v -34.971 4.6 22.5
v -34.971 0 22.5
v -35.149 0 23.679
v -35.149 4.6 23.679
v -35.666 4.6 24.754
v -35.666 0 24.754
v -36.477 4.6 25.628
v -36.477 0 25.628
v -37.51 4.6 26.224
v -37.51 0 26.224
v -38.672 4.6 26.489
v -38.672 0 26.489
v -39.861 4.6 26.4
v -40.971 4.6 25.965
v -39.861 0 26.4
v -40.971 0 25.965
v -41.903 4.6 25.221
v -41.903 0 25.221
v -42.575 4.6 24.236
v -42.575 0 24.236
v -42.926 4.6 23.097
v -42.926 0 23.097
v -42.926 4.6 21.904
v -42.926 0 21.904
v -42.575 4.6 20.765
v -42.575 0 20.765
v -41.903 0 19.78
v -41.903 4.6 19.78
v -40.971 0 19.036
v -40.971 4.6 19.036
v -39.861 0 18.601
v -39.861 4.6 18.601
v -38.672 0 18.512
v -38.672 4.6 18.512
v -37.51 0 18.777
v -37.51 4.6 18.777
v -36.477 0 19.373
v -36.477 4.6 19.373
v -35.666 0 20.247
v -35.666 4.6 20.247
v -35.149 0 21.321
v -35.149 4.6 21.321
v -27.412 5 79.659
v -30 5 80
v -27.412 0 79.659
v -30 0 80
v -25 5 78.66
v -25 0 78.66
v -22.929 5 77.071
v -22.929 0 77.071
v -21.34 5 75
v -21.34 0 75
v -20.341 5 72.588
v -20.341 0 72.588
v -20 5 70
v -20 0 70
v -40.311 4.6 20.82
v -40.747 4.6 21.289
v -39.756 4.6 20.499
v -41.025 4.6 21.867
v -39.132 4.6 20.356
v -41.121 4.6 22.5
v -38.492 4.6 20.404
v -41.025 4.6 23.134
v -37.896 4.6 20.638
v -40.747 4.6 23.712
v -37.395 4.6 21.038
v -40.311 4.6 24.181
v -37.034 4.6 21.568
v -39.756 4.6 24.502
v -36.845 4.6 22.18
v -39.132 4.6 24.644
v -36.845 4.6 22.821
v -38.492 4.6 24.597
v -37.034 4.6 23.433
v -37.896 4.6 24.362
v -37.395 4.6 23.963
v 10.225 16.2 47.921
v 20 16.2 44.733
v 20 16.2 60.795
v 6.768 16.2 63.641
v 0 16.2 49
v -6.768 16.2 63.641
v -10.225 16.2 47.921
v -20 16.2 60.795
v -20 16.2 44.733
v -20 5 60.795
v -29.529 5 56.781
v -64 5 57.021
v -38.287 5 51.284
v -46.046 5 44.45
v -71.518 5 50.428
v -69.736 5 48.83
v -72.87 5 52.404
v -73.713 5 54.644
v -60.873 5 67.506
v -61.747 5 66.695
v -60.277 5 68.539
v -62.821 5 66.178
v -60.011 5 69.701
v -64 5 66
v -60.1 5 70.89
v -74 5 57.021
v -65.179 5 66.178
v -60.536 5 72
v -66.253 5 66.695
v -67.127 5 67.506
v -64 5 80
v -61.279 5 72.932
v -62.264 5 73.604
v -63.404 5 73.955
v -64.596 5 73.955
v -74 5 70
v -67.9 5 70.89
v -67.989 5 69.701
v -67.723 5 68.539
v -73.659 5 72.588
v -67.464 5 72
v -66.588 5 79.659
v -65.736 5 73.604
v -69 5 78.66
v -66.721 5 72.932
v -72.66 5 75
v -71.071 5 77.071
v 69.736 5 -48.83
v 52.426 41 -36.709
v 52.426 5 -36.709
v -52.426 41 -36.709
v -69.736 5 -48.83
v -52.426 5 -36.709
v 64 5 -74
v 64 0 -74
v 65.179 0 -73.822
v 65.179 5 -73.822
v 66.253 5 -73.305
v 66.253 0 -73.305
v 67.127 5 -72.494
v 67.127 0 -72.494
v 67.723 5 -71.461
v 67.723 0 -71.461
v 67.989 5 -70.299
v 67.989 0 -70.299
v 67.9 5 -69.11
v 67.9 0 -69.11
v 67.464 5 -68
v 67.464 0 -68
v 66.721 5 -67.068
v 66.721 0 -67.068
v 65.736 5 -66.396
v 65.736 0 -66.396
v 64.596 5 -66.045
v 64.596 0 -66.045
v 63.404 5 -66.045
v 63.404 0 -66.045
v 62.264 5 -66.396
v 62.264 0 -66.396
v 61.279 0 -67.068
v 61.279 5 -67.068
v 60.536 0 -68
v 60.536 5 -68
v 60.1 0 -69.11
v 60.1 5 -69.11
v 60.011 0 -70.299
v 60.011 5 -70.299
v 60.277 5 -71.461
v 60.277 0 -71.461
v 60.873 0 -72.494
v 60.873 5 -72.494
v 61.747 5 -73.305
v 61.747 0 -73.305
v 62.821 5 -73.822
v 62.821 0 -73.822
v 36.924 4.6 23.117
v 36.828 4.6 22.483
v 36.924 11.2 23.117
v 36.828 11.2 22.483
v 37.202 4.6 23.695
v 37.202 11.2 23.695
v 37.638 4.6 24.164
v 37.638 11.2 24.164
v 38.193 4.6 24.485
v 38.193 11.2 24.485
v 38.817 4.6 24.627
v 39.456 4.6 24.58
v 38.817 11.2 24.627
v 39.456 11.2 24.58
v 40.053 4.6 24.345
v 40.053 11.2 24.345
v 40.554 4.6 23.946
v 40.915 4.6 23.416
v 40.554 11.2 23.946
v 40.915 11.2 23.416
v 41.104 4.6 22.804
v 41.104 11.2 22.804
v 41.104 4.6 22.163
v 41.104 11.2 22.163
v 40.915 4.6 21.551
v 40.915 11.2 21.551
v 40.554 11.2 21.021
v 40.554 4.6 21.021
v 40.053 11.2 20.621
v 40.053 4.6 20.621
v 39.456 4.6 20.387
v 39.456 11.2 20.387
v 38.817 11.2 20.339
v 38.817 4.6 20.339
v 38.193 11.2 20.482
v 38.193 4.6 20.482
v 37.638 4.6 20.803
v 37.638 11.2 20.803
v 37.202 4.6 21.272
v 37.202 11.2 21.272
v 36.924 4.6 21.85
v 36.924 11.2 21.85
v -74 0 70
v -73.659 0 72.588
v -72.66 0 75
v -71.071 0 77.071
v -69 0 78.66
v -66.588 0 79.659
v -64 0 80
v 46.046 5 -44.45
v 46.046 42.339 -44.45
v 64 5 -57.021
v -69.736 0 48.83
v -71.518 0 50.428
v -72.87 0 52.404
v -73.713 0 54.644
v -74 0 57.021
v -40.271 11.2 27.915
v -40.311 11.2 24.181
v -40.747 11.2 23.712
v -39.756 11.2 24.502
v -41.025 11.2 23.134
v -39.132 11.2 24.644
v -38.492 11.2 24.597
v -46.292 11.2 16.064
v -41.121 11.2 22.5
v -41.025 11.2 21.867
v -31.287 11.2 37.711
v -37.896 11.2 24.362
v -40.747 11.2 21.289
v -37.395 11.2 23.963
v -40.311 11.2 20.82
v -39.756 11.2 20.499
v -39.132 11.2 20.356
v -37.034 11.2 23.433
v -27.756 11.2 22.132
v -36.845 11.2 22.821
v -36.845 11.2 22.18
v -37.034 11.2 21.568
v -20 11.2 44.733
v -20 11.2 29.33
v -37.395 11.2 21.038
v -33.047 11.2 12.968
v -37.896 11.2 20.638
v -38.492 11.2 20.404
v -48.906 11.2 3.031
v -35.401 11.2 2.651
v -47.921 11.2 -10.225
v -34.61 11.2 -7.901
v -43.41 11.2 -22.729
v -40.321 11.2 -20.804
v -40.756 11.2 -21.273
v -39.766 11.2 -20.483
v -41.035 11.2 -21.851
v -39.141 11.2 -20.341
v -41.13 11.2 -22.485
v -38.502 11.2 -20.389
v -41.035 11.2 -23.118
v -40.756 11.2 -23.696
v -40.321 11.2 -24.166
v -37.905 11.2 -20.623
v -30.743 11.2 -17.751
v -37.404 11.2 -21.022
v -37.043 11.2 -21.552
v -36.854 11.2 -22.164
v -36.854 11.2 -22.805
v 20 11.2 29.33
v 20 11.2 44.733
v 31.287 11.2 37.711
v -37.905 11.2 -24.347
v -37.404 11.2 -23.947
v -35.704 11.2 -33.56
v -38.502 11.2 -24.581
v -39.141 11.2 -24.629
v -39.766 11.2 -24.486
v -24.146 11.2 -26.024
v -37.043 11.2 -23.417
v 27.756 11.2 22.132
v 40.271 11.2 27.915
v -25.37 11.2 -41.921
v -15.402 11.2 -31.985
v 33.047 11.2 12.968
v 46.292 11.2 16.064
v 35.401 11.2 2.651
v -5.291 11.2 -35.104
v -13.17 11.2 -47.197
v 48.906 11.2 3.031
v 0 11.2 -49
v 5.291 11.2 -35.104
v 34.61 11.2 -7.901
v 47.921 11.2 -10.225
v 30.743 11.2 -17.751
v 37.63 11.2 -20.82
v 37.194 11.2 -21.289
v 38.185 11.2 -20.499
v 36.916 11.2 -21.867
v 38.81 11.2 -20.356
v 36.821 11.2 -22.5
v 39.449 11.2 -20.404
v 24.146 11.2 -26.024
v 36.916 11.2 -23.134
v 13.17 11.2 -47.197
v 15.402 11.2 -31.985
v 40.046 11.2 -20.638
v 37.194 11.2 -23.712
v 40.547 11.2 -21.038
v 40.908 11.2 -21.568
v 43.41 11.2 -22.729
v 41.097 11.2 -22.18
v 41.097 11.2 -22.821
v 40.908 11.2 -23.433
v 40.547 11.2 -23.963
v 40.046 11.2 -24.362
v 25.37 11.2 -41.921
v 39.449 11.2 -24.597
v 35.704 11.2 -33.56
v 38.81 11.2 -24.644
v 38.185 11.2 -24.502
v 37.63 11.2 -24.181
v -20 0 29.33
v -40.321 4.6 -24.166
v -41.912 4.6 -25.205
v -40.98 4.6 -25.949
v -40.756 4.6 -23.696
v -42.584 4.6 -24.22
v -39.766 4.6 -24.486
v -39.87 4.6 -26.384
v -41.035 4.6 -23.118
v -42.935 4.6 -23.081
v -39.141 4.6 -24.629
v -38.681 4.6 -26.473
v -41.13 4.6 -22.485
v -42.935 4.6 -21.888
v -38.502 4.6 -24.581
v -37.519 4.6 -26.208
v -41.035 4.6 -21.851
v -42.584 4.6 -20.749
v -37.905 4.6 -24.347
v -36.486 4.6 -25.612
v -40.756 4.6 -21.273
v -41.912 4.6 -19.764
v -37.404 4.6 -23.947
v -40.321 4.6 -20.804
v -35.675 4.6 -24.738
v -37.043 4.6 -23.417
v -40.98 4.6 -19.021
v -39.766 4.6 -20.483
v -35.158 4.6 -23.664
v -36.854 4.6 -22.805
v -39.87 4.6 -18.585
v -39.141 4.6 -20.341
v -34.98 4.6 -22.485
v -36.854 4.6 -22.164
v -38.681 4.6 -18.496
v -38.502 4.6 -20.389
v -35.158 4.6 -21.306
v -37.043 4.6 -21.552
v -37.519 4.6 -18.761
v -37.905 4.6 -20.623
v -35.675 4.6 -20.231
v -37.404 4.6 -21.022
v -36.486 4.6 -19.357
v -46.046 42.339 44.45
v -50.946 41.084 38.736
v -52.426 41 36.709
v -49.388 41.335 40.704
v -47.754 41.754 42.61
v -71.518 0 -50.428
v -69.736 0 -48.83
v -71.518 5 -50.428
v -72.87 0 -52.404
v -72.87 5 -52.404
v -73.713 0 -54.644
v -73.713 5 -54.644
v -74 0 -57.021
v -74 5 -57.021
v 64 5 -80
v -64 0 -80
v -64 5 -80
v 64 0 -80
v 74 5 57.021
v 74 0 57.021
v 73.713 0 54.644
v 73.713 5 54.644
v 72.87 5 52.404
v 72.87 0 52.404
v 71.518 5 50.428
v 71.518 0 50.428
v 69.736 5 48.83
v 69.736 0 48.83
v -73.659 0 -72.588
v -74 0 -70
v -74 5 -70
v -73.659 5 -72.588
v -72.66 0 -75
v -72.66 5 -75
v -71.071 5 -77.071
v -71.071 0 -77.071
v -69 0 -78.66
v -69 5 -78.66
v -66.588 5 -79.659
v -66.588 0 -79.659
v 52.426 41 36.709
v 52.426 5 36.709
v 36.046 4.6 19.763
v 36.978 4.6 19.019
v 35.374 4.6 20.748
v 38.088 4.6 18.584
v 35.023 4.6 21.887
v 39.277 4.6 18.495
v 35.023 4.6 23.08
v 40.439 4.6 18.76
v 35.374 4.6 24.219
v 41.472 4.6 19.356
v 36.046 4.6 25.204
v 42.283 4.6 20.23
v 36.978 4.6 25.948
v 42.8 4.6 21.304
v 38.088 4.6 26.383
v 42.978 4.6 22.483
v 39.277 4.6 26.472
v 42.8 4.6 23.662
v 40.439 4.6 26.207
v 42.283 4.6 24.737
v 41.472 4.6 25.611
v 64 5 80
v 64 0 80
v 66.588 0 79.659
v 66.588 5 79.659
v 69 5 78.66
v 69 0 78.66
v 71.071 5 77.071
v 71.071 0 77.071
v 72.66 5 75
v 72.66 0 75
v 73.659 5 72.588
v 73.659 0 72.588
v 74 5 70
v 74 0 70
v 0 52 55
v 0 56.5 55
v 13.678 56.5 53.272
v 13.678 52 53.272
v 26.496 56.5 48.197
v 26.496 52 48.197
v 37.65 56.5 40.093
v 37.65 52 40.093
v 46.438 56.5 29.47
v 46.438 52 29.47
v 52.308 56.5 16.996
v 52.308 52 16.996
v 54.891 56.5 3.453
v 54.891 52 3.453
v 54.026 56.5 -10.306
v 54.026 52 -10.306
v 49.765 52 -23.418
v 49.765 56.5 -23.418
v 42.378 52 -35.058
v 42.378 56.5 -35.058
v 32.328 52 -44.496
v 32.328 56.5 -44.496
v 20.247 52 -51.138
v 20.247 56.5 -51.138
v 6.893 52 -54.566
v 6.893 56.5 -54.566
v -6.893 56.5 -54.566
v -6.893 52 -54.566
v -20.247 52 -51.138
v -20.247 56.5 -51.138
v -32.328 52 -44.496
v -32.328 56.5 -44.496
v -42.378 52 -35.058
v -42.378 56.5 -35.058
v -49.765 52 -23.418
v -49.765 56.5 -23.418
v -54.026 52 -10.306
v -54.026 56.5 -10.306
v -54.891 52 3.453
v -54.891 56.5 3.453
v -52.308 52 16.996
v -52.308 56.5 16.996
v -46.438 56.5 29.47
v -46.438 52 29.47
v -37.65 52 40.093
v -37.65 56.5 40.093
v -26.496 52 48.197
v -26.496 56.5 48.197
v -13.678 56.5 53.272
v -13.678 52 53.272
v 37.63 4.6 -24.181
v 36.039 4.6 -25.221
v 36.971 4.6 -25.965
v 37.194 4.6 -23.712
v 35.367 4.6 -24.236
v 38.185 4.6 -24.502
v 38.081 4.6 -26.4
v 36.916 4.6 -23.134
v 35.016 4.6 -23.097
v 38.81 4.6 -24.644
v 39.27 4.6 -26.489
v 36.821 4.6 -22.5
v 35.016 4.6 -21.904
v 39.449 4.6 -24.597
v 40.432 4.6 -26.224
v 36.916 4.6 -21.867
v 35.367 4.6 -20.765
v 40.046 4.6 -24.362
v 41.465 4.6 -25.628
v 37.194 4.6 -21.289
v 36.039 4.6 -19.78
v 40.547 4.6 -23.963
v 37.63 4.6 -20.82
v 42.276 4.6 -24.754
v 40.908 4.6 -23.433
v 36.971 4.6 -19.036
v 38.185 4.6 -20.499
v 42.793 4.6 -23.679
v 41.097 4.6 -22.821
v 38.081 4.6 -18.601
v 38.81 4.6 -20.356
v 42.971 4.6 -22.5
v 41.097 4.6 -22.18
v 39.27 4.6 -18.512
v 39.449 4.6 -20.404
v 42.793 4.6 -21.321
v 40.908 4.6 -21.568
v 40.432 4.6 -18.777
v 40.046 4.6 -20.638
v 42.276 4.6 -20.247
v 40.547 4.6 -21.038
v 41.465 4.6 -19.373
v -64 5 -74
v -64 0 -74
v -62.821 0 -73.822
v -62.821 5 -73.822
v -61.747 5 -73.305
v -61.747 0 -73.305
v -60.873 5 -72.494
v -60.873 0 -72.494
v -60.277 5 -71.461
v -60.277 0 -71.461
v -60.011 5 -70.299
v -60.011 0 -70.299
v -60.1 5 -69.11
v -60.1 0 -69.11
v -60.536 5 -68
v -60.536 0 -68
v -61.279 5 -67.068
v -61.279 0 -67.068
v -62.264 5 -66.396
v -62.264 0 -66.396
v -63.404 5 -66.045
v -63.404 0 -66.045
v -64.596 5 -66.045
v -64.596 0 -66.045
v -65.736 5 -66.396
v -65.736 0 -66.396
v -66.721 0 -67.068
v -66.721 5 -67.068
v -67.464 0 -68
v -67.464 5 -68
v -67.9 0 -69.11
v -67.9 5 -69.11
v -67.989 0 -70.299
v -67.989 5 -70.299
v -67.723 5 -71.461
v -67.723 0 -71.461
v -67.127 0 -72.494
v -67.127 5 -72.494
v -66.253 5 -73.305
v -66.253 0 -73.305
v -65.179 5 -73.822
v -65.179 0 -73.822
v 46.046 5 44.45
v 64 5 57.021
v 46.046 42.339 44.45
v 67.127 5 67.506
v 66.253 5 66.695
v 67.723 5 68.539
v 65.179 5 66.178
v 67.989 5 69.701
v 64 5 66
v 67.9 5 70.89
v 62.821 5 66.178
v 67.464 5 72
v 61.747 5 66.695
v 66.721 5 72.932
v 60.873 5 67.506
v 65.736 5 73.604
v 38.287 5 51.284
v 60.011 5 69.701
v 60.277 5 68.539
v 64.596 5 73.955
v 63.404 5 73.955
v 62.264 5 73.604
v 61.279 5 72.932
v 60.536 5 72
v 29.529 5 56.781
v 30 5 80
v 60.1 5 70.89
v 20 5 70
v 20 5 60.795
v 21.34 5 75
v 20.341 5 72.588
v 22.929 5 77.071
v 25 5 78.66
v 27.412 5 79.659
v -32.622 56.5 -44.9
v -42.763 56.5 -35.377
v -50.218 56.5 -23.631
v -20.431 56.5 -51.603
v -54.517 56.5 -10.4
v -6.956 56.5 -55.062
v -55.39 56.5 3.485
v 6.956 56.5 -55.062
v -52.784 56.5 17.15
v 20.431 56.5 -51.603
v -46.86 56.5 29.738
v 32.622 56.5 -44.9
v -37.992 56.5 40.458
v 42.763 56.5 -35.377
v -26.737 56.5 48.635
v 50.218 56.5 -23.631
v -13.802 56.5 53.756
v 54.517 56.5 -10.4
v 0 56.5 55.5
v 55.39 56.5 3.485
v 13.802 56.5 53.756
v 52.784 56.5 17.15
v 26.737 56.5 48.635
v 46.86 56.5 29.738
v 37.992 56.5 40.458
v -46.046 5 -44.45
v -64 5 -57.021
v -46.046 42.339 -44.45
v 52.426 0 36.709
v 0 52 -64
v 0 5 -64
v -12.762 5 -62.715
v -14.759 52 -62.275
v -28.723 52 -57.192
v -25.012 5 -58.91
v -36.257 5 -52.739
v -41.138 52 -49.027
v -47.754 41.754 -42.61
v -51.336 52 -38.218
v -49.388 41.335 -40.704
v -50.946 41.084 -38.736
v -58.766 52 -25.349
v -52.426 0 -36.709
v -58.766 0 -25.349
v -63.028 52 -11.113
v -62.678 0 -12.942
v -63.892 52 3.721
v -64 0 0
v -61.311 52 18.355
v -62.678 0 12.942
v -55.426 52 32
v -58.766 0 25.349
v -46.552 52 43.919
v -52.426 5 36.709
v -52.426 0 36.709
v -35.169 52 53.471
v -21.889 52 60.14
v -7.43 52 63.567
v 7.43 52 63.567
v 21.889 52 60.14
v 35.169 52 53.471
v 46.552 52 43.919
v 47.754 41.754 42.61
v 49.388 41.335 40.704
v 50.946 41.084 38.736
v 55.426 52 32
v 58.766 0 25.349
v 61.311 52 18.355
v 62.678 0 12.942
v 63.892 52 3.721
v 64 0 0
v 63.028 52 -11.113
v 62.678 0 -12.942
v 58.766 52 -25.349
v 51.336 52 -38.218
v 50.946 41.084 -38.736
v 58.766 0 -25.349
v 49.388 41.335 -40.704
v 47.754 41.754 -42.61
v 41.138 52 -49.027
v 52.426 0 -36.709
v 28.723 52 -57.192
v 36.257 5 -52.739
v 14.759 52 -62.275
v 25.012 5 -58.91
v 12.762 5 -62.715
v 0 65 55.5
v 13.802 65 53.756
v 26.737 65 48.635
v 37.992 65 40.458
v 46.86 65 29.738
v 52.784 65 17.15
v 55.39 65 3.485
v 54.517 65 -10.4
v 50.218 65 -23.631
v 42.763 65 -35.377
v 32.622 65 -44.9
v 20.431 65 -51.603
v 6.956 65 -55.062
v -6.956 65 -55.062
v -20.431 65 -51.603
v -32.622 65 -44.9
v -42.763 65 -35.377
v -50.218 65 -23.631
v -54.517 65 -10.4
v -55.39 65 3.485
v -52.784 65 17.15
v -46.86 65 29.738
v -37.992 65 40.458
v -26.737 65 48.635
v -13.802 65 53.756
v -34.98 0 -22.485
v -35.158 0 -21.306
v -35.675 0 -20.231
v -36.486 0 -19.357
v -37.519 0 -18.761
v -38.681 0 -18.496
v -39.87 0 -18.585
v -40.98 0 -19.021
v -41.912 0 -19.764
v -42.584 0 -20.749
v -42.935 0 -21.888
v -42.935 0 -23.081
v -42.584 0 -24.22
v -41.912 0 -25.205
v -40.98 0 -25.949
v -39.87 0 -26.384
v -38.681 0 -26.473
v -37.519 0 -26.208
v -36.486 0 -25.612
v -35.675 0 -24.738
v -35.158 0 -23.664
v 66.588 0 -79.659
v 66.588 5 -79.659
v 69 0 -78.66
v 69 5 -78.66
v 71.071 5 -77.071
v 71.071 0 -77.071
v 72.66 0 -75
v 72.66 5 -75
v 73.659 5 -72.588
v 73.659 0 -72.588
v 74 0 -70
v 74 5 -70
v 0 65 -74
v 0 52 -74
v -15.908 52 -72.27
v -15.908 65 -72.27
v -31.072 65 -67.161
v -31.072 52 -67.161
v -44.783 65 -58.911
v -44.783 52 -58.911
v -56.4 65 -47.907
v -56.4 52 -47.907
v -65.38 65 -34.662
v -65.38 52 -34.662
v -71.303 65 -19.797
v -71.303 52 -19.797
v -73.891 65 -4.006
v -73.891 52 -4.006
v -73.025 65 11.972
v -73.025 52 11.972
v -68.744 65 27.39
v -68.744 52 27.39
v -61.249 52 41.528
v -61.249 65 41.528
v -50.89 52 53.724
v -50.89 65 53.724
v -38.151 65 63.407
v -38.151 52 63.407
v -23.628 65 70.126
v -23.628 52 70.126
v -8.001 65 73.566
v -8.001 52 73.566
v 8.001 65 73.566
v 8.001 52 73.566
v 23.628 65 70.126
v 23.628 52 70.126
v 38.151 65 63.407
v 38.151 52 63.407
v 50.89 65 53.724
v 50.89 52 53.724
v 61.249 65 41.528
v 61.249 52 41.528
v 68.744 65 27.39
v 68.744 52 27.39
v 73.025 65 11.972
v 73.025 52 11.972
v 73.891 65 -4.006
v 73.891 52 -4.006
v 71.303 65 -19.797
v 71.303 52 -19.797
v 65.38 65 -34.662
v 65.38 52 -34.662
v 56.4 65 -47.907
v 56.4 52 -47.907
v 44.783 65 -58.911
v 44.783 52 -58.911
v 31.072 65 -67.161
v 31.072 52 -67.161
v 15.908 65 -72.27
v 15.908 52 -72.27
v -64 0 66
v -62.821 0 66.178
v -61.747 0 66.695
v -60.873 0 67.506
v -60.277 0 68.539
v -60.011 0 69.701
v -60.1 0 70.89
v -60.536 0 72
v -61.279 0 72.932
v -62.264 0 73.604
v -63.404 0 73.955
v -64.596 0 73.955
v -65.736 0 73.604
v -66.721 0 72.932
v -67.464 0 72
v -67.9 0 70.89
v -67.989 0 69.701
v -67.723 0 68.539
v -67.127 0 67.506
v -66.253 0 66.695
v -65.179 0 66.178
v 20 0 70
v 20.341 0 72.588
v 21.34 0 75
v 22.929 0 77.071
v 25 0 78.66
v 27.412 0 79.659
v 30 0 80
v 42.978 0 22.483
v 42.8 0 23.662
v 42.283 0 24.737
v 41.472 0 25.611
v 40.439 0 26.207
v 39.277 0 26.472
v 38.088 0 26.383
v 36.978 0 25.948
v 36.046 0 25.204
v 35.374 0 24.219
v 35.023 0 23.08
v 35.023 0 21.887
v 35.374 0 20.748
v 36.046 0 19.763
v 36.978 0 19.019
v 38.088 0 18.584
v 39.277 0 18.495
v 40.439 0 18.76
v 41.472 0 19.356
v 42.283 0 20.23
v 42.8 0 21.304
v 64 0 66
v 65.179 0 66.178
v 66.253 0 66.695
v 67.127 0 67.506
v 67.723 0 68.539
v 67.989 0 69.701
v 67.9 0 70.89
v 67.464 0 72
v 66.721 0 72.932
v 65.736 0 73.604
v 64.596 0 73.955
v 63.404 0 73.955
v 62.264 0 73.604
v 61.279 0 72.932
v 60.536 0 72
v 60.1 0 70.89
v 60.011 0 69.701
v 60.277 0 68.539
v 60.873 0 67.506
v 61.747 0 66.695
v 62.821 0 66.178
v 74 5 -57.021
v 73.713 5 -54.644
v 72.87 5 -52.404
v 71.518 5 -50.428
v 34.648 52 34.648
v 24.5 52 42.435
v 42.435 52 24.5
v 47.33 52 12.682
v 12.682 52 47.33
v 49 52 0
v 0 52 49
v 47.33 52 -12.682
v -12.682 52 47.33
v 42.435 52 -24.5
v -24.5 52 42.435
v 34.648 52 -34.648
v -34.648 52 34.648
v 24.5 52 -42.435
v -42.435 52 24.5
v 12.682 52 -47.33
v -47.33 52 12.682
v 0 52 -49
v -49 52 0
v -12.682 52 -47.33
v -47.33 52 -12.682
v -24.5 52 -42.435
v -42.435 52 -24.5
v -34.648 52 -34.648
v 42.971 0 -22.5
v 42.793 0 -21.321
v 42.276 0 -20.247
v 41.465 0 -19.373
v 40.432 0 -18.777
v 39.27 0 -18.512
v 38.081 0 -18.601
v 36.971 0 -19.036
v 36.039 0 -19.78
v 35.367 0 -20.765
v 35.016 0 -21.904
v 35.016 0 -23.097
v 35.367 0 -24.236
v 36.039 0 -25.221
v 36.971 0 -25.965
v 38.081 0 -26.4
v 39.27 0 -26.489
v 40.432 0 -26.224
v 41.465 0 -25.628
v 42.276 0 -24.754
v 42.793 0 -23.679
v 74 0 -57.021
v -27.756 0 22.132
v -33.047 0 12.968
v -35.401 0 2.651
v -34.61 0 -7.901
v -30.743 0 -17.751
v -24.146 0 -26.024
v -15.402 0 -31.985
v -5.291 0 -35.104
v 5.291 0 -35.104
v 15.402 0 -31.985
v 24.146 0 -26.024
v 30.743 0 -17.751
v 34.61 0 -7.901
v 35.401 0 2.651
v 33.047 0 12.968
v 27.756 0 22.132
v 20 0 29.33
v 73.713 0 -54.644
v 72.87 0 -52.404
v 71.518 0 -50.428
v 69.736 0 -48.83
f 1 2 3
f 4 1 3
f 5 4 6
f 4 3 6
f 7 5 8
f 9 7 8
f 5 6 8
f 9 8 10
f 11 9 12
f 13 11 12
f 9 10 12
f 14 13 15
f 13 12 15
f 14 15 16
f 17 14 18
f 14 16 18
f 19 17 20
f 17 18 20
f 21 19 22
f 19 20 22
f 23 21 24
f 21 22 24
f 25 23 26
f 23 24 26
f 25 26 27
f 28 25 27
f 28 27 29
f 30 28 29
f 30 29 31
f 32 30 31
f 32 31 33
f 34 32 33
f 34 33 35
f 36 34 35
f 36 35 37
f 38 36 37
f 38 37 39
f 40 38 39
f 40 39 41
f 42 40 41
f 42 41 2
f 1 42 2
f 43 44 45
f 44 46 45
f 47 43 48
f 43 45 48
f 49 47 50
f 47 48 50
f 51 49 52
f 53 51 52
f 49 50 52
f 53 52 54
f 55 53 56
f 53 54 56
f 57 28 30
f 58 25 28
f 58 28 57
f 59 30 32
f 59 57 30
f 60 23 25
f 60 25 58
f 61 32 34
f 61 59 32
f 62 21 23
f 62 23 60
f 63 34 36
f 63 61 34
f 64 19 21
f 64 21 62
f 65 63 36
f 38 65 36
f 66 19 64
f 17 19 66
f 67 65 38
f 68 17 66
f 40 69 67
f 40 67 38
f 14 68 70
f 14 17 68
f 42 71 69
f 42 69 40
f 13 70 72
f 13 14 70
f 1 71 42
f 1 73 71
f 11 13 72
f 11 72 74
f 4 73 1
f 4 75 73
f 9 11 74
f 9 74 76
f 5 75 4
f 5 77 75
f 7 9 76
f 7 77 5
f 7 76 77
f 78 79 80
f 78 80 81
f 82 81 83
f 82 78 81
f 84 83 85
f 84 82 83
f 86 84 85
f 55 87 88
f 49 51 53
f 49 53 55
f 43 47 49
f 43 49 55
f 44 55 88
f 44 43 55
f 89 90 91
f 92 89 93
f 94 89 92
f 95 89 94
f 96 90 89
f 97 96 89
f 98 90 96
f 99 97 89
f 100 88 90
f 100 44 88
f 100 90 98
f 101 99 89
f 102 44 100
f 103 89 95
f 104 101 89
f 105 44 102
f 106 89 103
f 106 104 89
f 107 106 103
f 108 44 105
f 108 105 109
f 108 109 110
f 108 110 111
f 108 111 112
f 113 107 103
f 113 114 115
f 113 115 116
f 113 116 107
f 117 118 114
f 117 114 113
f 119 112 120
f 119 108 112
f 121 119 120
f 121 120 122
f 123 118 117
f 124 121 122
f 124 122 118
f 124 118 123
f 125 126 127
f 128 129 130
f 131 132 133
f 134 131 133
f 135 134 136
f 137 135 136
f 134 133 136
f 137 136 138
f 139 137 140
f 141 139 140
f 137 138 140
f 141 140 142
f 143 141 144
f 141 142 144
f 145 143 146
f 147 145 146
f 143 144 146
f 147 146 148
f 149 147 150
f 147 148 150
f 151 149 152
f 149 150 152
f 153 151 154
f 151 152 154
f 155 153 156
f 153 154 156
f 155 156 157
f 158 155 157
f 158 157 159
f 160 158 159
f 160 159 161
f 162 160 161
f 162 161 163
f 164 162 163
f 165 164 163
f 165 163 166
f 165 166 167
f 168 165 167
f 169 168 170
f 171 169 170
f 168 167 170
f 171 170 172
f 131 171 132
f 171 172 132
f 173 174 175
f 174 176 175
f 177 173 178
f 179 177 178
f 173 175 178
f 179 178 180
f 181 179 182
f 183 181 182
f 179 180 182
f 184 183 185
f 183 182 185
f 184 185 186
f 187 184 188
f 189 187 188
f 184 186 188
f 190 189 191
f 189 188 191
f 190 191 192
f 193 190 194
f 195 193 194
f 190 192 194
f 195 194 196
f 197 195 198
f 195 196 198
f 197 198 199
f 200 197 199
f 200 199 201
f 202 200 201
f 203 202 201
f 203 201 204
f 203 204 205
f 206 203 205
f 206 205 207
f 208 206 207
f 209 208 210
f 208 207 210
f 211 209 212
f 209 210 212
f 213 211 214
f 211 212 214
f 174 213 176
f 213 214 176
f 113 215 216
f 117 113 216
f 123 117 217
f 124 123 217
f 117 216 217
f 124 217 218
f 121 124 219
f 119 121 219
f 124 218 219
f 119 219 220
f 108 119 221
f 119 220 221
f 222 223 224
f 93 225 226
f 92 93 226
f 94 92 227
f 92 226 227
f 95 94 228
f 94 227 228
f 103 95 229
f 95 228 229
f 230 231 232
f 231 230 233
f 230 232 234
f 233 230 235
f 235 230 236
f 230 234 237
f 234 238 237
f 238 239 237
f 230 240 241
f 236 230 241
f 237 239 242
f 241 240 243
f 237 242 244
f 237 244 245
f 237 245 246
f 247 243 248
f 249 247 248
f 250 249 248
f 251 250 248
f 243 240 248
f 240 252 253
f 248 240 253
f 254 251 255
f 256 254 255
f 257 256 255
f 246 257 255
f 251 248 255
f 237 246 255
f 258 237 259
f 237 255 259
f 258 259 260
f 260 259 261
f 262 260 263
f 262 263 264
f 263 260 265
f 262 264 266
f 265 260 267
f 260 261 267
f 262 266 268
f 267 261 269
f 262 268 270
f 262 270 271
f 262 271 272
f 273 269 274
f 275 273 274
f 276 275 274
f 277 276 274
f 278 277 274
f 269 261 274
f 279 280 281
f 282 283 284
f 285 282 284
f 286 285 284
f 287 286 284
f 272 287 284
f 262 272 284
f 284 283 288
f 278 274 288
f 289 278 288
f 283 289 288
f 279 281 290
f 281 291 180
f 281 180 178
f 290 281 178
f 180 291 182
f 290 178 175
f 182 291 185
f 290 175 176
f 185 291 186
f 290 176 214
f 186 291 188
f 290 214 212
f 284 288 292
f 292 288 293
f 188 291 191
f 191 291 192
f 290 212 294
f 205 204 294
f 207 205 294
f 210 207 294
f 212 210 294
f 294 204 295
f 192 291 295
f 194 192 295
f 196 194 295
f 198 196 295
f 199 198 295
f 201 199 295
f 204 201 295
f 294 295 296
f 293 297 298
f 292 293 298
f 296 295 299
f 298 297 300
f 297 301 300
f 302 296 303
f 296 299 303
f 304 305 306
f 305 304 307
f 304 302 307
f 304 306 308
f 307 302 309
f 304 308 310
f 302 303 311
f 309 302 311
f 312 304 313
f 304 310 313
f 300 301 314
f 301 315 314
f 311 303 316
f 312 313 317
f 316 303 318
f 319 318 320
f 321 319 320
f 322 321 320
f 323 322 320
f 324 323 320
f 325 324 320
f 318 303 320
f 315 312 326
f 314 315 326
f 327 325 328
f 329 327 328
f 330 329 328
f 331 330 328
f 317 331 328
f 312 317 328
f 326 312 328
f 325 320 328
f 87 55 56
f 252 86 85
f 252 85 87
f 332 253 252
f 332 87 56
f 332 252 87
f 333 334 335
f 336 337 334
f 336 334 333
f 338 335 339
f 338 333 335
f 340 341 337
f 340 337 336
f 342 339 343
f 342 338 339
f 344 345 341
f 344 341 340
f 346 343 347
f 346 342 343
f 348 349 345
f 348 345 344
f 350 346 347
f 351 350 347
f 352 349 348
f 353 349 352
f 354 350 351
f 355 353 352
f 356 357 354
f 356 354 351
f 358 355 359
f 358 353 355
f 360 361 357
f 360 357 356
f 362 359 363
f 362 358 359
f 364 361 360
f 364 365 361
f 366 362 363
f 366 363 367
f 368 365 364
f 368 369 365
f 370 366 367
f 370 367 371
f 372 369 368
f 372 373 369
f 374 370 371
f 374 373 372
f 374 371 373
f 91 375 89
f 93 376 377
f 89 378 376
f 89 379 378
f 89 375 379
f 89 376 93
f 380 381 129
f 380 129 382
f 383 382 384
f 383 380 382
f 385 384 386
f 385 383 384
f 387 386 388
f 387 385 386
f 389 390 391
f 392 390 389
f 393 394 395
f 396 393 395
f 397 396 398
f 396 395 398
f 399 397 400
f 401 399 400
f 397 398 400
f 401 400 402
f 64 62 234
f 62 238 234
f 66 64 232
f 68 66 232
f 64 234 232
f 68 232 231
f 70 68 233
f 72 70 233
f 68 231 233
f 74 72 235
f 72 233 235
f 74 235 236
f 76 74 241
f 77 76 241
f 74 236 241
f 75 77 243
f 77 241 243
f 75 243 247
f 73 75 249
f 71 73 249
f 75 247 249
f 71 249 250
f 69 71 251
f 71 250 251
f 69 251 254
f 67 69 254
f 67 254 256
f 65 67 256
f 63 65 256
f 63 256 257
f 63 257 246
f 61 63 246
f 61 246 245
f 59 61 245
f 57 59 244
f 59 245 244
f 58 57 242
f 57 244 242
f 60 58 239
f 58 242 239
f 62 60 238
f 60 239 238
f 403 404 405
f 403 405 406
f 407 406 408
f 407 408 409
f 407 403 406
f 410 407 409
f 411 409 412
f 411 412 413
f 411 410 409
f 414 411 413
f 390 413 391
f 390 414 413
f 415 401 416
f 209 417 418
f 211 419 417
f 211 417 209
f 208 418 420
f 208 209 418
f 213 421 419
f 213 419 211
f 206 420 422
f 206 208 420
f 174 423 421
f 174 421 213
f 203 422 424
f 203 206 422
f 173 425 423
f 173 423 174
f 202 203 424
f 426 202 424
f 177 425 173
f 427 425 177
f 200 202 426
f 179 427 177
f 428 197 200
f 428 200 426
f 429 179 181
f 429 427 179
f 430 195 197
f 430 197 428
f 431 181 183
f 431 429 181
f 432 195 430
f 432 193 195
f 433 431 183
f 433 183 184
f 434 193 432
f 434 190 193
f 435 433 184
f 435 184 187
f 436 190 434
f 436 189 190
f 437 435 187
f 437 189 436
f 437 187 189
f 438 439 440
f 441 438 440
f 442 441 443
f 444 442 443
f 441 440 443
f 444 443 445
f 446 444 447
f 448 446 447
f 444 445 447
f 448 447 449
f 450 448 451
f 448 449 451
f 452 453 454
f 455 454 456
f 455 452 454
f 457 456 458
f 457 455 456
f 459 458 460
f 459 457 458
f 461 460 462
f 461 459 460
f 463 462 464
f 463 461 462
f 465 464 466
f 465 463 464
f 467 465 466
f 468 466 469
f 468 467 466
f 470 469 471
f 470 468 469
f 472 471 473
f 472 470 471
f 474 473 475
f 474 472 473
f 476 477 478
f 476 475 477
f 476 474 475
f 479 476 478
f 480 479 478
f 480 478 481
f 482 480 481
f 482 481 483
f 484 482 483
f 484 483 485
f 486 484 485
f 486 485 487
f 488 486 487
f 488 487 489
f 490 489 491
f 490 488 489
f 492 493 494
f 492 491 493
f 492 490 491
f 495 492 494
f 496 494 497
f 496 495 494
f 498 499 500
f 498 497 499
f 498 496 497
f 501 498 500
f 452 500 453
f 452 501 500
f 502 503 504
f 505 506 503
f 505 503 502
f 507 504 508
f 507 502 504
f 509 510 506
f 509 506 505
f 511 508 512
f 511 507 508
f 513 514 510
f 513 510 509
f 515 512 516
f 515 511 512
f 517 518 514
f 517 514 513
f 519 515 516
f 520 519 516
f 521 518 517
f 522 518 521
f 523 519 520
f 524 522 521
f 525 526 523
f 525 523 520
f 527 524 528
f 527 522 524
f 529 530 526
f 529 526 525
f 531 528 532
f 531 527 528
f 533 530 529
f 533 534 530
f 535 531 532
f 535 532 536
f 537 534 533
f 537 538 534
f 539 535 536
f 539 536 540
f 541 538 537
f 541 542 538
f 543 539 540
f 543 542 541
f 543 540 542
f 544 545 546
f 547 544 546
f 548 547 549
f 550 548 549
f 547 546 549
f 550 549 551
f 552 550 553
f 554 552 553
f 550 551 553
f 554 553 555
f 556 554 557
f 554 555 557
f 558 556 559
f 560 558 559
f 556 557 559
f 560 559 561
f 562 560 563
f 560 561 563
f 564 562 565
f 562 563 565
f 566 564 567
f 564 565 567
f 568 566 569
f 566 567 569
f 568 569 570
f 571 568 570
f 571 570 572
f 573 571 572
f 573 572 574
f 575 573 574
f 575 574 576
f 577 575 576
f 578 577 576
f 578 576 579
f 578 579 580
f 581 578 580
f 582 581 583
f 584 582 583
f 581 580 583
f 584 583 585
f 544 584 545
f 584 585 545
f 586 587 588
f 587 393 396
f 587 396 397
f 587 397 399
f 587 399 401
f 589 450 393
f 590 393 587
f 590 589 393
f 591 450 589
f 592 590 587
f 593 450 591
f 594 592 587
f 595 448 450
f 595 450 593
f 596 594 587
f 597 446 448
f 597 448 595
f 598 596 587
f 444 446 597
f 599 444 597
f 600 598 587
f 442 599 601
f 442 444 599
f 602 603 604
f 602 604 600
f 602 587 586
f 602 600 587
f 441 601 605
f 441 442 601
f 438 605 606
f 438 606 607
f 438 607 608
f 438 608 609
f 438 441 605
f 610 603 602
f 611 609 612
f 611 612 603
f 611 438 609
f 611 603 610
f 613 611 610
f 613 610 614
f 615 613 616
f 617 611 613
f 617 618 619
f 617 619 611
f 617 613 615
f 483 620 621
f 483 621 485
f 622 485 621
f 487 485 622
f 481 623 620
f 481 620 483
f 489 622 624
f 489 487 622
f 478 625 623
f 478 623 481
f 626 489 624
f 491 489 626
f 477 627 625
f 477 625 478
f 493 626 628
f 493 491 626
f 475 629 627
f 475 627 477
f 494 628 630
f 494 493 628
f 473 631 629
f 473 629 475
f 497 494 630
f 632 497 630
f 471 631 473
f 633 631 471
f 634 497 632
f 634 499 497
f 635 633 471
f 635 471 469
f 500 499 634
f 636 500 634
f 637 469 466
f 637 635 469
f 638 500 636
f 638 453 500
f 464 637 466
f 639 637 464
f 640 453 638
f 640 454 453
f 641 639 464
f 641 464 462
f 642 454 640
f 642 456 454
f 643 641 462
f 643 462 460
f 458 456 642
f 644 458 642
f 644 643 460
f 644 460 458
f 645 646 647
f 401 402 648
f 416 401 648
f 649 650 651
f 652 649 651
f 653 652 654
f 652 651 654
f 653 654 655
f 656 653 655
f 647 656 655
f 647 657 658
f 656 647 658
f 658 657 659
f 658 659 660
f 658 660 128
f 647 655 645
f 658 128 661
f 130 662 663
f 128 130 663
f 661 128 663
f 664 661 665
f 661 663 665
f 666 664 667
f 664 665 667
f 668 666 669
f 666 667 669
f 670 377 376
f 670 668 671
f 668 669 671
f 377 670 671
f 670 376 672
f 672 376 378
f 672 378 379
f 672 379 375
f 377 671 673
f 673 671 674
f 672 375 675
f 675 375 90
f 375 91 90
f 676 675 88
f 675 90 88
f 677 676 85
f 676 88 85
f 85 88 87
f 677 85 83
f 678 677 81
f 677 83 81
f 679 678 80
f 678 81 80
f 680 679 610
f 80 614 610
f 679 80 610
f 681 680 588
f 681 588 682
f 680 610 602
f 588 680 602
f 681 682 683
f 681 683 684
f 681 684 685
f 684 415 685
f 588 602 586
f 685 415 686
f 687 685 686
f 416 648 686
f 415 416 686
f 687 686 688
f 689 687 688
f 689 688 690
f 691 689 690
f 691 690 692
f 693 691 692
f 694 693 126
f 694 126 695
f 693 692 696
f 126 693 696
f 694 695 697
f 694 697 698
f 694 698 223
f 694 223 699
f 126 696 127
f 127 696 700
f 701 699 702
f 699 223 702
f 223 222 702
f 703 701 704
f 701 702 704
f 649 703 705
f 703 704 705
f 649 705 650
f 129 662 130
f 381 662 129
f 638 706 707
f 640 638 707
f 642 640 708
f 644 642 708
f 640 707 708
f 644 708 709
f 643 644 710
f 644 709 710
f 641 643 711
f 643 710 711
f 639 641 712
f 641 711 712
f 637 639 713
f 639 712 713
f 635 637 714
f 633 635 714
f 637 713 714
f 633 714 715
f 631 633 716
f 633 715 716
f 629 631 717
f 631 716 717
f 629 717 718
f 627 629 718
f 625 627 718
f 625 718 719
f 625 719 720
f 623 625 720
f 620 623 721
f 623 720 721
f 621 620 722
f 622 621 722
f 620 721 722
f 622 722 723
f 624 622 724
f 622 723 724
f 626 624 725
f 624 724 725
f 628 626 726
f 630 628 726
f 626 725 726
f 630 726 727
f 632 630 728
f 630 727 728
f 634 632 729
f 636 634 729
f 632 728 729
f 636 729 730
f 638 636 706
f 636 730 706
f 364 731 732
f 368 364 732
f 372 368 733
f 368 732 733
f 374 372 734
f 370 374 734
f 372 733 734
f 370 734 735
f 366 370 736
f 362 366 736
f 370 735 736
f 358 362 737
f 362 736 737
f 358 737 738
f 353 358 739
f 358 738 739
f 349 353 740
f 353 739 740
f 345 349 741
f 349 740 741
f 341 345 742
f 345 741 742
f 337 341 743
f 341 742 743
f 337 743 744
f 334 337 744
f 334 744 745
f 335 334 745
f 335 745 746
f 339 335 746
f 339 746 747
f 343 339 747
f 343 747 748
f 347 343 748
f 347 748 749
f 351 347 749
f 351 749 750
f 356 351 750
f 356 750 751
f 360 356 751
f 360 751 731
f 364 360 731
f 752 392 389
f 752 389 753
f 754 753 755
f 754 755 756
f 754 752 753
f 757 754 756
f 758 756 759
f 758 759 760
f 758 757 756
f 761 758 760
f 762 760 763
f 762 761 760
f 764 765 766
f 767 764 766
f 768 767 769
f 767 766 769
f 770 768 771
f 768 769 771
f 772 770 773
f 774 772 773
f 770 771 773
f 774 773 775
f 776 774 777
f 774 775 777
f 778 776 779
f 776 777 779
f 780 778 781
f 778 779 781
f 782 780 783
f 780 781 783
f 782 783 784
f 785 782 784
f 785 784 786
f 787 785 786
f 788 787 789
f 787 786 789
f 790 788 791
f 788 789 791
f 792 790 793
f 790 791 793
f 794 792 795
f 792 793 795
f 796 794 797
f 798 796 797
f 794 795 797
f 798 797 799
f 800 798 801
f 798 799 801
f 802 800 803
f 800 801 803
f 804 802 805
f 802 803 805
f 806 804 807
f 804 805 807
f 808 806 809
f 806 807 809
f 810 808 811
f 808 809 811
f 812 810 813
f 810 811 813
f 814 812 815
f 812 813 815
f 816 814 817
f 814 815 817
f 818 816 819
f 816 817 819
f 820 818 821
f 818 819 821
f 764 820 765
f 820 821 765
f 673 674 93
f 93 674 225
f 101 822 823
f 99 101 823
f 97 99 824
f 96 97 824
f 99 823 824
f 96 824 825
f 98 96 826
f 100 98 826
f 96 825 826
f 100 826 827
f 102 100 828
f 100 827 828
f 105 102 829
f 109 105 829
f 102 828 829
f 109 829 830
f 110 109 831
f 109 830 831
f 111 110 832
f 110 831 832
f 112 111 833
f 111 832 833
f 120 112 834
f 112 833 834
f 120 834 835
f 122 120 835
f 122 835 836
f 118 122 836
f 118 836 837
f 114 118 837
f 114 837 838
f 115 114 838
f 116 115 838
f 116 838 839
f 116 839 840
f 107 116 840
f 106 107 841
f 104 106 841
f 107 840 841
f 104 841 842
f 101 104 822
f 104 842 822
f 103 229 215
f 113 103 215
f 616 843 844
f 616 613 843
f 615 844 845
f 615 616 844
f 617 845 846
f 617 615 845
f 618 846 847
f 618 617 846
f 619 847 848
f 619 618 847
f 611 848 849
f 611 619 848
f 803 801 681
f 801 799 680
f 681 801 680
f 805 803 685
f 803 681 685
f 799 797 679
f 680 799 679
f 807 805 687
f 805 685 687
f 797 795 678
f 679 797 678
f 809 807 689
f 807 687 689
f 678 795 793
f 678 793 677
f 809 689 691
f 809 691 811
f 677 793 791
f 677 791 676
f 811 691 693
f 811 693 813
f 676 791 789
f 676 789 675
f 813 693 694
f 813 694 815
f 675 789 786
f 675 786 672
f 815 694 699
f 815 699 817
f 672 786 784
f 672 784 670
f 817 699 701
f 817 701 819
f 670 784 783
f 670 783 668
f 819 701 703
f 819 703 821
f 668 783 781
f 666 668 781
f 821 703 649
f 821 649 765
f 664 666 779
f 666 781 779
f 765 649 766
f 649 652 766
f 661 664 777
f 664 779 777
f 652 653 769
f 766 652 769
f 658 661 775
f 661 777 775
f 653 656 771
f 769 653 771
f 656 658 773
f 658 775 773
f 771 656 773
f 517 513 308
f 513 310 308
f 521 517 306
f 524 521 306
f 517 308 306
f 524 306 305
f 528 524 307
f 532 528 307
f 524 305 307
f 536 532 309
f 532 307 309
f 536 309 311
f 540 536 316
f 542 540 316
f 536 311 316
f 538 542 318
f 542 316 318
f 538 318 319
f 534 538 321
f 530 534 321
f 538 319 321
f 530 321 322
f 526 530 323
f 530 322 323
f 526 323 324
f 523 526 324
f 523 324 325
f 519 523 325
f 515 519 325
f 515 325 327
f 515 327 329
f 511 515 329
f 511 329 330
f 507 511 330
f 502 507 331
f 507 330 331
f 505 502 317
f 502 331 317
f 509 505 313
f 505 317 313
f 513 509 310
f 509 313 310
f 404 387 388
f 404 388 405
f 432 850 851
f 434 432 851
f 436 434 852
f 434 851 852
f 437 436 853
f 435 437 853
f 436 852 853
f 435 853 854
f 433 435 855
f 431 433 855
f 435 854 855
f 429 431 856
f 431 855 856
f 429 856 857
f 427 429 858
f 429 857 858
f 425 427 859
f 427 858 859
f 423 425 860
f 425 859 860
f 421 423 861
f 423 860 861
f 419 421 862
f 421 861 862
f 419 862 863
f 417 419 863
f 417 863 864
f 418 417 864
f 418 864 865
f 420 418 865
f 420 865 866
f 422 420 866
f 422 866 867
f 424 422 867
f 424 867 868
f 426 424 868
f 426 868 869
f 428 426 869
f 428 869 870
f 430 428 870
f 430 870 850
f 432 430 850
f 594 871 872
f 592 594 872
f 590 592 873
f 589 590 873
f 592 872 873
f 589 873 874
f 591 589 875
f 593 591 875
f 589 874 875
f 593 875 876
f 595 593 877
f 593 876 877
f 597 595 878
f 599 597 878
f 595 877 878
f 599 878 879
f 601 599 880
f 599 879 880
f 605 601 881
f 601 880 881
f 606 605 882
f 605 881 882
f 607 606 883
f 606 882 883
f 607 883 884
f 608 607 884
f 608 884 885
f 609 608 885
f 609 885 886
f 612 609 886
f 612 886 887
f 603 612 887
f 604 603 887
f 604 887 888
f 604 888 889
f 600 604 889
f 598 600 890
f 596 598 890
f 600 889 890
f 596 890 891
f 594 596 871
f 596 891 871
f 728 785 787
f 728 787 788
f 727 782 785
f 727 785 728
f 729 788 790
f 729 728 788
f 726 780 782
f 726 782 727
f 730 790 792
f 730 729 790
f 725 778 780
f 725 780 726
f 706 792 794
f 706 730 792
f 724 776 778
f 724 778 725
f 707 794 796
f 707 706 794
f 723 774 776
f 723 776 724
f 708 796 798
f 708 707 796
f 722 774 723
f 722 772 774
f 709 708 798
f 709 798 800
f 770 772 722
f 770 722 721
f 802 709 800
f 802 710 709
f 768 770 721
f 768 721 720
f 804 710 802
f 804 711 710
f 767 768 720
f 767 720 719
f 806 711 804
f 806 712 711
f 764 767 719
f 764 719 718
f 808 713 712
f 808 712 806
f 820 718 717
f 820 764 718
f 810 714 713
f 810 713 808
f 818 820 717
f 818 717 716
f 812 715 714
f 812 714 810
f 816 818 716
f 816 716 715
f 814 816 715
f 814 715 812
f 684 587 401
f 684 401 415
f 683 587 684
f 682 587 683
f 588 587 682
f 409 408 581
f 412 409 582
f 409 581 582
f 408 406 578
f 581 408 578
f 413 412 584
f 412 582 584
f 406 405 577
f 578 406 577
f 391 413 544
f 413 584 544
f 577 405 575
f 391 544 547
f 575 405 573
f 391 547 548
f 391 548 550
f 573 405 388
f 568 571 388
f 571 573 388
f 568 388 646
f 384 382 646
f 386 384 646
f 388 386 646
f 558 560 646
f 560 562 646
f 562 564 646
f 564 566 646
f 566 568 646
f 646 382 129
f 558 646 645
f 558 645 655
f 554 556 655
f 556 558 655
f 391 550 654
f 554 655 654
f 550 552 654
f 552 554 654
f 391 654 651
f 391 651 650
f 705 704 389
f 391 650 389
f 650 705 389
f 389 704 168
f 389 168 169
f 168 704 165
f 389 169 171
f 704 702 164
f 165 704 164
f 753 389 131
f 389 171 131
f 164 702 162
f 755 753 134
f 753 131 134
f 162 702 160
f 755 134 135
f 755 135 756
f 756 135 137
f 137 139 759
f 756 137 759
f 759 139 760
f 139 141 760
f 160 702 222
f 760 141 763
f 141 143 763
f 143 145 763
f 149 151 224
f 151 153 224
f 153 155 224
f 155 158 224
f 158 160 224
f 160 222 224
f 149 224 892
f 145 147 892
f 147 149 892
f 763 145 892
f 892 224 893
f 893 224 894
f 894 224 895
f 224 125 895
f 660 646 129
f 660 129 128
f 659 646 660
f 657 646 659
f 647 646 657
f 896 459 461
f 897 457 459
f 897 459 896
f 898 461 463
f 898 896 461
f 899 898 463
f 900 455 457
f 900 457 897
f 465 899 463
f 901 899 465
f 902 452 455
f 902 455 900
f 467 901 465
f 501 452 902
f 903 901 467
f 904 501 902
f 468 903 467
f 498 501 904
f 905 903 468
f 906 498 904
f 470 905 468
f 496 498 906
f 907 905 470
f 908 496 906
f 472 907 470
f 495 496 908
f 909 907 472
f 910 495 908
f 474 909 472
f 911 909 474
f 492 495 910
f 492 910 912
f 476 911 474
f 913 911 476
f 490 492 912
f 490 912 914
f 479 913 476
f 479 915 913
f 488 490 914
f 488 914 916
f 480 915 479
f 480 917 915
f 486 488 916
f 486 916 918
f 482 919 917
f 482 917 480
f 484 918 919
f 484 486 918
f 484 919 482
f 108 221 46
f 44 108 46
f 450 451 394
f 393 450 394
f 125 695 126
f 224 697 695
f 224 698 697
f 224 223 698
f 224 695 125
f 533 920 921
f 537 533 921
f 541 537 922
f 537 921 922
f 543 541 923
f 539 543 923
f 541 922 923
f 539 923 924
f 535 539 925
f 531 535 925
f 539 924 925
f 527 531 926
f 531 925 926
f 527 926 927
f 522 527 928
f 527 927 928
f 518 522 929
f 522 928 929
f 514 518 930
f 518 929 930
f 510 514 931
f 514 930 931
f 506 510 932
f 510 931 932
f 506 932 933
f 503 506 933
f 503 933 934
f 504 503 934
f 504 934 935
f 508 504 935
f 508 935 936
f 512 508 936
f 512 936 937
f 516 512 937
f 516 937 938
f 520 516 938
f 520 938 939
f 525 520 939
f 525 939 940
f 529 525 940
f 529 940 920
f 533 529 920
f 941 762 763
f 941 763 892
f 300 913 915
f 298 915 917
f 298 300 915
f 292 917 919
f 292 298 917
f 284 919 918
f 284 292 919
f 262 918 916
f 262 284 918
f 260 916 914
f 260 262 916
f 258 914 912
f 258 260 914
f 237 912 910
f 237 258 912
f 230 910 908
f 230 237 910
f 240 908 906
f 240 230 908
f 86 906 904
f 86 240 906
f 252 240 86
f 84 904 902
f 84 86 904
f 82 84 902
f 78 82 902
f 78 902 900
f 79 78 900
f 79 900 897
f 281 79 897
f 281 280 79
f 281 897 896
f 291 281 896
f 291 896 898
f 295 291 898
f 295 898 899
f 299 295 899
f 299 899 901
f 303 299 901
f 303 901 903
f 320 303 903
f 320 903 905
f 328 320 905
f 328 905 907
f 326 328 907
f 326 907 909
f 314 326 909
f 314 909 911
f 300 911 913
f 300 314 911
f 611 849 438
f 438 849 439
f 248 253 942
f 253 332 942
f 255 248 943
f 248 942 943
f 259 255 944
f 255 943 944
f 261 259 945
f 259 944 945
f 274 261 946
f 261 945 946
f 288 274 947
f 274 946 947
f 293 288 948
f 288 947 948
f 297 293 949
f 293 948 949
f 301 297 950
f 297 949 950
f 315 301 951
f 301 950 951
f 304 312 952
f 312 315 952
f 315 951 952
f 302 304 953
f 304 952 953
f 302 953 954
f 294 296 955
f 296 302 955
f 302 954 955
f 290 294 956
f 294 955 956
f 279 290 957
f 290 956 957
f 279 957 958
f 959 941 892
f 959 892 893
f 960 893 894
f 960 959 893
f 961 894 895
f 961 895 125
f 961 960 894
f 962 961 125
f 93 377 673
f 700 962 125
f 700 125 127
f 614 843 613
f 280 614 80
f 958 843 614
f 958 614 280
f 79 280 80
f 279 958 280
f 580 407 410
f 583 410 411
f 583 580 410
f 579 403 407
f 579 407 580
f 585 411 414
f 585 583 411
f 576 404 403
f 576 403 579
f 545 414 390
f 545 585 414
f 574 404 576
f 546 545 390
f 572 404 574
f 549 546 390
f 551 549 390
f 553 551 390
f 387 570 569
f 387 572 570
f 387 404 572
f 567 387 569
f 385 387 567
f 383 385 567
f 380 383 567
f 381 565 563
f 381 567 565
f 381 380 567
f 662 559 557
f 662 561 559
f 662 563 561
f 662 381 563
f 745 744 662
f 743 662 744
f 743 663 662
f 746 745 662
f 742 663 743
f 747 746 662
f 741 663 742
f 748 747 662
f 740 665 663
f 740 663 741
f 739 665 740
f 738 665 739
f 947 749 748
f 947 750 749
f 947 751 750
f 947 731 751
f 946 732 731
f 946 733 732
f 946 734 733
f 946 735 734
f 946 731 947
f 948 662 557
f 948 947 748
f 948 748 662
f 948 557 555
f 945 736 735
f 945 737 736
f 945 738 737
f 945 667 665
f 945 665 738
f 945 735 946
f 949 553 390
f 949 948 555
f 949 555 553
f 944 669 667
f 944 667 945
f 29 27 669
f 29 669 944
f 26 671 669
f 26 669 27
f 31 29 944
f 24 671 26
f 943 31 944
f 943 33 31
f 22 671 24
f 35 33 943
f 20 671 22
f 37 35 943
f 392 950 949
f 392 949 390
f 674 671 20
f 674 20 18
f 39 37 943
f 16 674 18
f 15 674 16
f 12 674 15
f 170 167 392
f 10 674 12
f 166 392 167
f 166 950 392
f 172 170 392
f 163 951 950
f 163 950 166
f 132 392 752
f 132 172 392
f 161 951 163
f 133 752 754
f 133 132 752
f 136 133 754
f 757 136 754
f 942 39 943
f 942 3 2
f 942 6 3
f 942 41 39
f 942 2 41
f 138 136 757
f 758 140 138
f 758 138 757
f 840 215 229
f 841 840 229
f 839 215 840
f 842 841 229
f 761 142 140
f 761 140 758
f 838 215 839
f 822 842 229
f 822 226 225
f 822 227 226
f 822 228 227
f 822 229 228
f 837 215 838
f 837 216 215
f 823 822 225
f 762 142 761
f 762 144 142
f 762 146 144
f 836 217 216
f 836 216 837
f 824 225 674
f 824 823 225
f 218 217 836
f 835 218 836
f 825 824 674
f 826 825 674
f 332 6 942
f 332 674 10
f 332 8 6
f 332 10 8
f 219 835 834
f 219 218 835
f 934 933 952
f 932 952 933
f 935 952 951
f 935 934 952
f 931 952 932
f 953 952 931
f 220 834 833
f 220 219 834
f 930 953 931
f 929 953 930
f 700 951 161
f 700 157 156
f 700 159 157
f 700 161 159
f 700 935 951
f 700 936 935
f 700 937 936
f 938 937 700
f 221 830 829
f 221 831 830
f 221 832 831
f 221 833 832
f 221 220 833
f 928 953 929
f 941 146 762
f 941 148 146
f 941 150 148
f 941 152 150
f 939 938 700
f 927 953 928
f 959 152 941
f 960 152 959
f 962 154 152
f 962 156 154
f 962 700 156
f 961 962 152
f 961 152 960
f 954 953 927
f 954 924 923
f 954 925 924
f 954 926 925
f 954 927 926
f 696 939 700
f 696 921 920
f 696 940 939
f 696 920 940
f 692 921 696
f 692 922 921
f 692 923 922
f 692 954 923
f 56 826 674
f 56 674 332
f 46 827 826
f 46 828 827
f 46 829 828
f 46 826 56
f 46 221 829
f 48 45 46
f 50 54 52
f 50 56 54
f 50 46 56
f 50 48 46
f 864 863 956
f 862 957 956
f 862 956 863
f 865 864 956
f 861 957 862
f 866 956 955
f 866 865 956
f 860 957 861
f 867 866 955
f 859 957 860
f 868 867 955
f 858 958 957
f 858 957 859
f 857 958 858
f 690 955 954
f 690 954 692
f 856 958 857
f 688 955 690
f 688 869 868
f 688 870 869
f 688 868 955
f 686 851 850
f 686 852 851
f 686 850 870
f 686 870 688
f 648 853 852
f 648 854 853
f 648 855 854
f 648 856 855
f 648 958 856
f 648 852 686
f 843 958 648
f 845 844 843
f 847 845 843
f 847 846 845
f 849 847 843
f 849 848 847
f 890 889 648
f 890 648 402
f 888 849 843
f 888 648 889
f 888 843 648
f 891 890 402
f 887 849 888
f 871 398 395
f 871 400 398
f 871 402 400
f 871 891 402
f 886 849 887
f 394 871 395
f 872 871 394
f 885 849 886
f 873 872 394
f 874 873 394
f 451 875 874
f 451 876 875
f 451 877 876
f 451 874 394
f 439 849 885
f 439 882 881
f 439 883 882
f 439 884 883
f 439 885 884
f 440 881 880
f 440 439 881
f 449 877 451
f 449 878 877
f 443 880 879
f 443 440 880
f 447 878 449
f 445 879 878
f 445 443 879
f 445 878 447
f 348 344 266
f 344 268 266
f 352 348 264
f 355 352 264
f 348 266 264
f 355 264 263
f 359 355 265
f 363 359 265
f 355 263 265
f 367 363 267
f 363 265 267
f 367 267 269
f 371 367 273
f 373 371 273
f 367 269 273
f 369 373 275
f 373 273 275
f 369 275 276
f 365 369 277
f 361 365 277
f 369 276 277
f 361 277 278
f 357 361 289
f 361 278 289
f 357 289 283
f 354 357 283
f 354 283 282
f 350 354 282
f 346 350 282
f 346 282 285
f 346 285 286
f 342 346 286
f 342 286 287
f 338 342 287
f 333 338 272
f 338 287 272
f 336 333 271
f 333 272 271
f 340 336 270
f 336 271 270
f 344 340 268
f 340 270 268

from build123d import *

# Parameters (mm, degrees)
SKETCH_1_R                    = 64
SKETCH_1_R_2                  = 49
EXTRUDE_1_DEPTH               = 52
SKETCH_13_R                   = 49
SKETCH_13_R_2                 = 35.5
EXTRUDE_3_DEPTH               = 11.2
HOLE_WIZARD_M4_11_D           = 4.3
HOLE_WIZARD_M4_11_CBORE_D     = 8
HOLE_WIZARD_M4_11_CBORE_DEPTH = 4.6
SKETCH_18_R                   = 74
SKETCH_18_R_2                 = 56
EXTRUDE_4_DEPTH               = 13
SKETCH_25_R                   = 4
EXTRUDE_7_DEPTH               = 5
SKETCH_28_R                   = 4
EXTRUDE_8_DEPTH               = 5
CUT_EXTRUDE_2_DEPTH           = 81
FILLET_4_R                    = 10
FILLET_5_R                    = 10
RIB_1_REACH                   = 128.89
SKETCH_32_WALL_W              = 297.523252796
SKETCH_32_WALL_H              = 10
RIB_2_REACH                   = 128.89
SKETCH_33_WALL_W              = 297.523252796
SKETCH_33_WALL_H              = 10
RIB_7_REACH                   = 128.89
SKETCH_34_WALL_W              = 297.523252796
SKETCH_34_WALL_H              = 10
RIB_9_REACH                   = 128.89
SKETCH_35_WALL_W              = 297.523252796
SKETCH_35_WALL_H              = 10
SKETCH_36_R                   = 56
SKETCH_36_R_2                 = 55
EXTRUDE_9_DEPTH               = 13
SKETCH_37_R                   = 55.5
CUT_EXTRUDE_3_DEPTH           = 8.5


with BuildPart() as part:
    # 草图1 → 凸台-拉伸1 (new body)
    with BuildSketch(Plane(origin=(0, 0, 0), x_dir=(1, 0, 0), z_dir=(0, 1, 0))):
        with Locations(Location((0, 0, 0), (0, 0, 90))):
            Circle(SKETCH_1_R)
        with Locations(Location((0, 0, 0), (0, 0, 90))):
            Circle(SKETCH_1_R_2, mode=Mode.SUBTRACT)
    extrude(amount=EXTRUDE_1_DEPTH)

    # 草图13 → 凸台-拉伸3 (add)
    with BuildSketch(Plane.XZ):
        with Locations(Location((0, 0, 0), (0, 0, 270))):
            Circle(SKETCH_13_R)
        with Locations(Location((0, 0, 0), (0, 0, 270))):
            Circle(SKETCH_13_R_2, mode=Mode.SUBTRACT)
    extrude(amount=-EXTRUDE_3_DEPTH)

    # M4 六角圆柱头螺钉的柱形沉头孔11 (through all)
    with Locations(Plane.XZ):
        with Locations((-38.980021964, -22.484614467), (38.970883682, -22.50044944), (-38.970883682, 22.50044944), (38.978008551, 22.483453082)):
            CounterBoreHole(HOLE_WIZARD_M4_11_D / 2, HOLE_WIZARD_M4_11_CBORE_D / 2, HOLE_WIZARD_M4_11_CBORE_DEPTH)

    # 草图18 → 凸台-拉伸4 (add)
    with BuildSketch(Plane(origin=(0, 52, 0), x_dir=(1, 0, 0), z_dir=(0, 1, 0))):
        with Locations(Location((0, 0, 0), (0, 0, 90))):
            Circle(SKETCH_18_R)
        with Locations(Location((0, 0, 0), (0, 0, 90))):
            Circle(SKETCH_18_R_2, mode=Mode.SUBTRACT)
    extrude(amount=EXTRUDE_4_DEPTH)

    # 草图25 → 凸台-拉伸7 (add)
    with BuildSketch(Plane.XZ):
        with BuildLine():
            Line((-74, 57.021028333), (-74, 70))
            ThreePointArc((-74, 70), (-71.071067812, 77.071067812), (-64, 80))
            Line((-64, 80), (64, 80))
            ThreePointArc((64, 80), (71.071067812, 77.071067812), (74, 70))
            Line((74, 70), (74, 57.021028333))
            ThreePointArc((74, 57.021028333), (72.870108332, 52.403542201), (69.735764364, 48.82950789))
            Line((69.735764364, 48.82950789), (52.425730834, 36.708891926))
            ThreePointArc((52.425730834, 36.708891926), (0, 64), (-52.425730834, 36.708891926))
            Line((-52.425730834, 36.708891926), (-69.735764364, 48.82950789))
            ThreePointArc((-69.735764364, 48.82950789), (-72.870108332, 52.403542201), (-74, 57.021028333))
        make_face()
        with Locations(Location((-64, 70, 0), (0, 0, 270))):
            Circle(SKETCH_25_R, mode=Mode.SUBTRACT)
        with Locations(Location((64, 70, 0), (0, 0, 270))):
            Circle(SKETCH_25_R, mode=Mode.SUBTRACT)
    extrude(amount=-EXTRUDE_7_DEPTH)

    # 草图28 → 凸台-拉伸8 (add)
    with BuildSketch(Plane.XZ):
        with BuildLine():
            Line((-52.425730834, -36.708891926), (-69.735764364, -48.82950789))
            ThreePointArc((-69.735764364, -48.82950789), (-72.870108332, -52.403542201), (-74, -57.021028333))
            Line((-74, -57.021028333), (-74, -70))
            ThreePointArc((-74, -70), (-71.071067812, -77.071067812), (-64, -80))
            Line((-64, -80), (64, -80))
            ThreePointArc((64, -80), (71.071067812, -77.071067812), (74, -70))
            Line((74, -70), (74, -57.021028333))
            ThreePointArc((74, -57.021028333), (72.870108332, -52.403542201), (69.735764364, -48.82950789))
            Line((69.735764364, -48.82950789), (52.425730834, -36.708891926))
            ThreePointArc((52.425730834, -36.708891926), (0, -64), (-52.425730834, -36.708891926))
        make_face()
        with Locations(Location((-64, -70, 0), (0, 0, 270))):
            Circle(SKETCH_28_R, mode=Mode.SUBTRACT)
        with Locations(Location((64, -70, 0), (0, 0, 270))):
            Circle(SKETCH_28_R, mode=Mode.SUBTRACT)
    extrude(amount=-EXTRUDE_8_DEPTH)

    # 草图14 → 切除-拉伸2 (cut)
    with BuildSketch(Plane.XY):
        Polygon((0, 0), (20, 0), (20, 16.2), (-20, 16.2), (-20, 0), align=None)
    extrude(amount=CUT_EXTRUDE_2_DEPTH, mode=Mode.SUBTRACT)

    # 圆角4
    fillet_4_edges = [part.edges().sort_by_distance(p)[0] for p in [
        (-20, 2.5, 80),
    ]]
    fillet(fillet_4_edges, radius=FILLET_4_R)

    # 圆角5
    fillet_5_edges = [part.edges().sort_by_distance(p)[0] for p in [
        (20, 2.5, 80),
    ]]
    fillet(fillet_5_edges, radius=FILLET_5_R)

    # 草图32 wall → 筋1 (add, up to next)
    with BuildSketch(Plane(origin=(61.080747599, 23, 42.769199908), x_dir=(-0.414672953097, 0.86240308464, -0.290357127642), z_dir=(0.706439249784, 0.506222203783, 0.494654087986)), mode=Mode.PRIVATE) as rib_1_sk1:
        with Locations((0, 5)):
            Rectangle(SKETCH_32_WALL_W, SKETCH_32_WALL_H)
    rib_1_tool1 = extrude(rib_1_sk1.sketch, amount=-RIB_1_REACH, mode=Mode.PRIVATE) - part.part
    add(rib_1_tool1.solids().sort_by_distance((61.080747599, 23, 42.769199908))[0])

    # 草图33 wall → 筋2 (add, up to next)
    with BuildSketch(Plane(origin=(-61.080747599, 23, 42.769199908), x_dir=(-0.414672953097, -0.86240308464, 0.290357127642), z_dir=(-0.706439249784, 0.506222203783, 0.494654087986)), mode=Mode.PRIVATE) as rib_2_sk1:
        with Locations((0, 5)):
            Rectangle(SKETCH_33_WALL_W, SKETCH_33_WALL_H)
    rib_2_tool1 = extrude(rib_2_sk1.sketch, amount=-RIB_2_REACH, mode=Mode.PRIVATE) - part.part
    add(rib_2_tool1.solids().sort_by_distance((-61.080747599, 23, 42.769199908))[0])

    # 草图34 wall → 筋7 (add, up to next)
    with BuildSketch(Plane(origin=(-61.080747599, 23, -42.769199908), x_dir=(0.414672953097, 0.86240308464, 0.290357127642), z_dir=(-0.706439249784, 0.506222203783, -0.494654087986)), mode=Mode.PRIVATE) as rib_7_sk1:
        with Locations((0, 5)):
            Rectangle(SKETCH_34_WALL_W, SKETCH_34_WALL_H)
    rib_7_tool1 = extrude(rib_7_sk1.sketch, amount=-RIB_7_REACH, mode=Mode.PRIVATE) - part.part
    add(rib_7_tool1.solids().sort_by_distance((-61.080747599, 23, -42.769199908))[0])

    # 草图35 wall → 筋9 (add, up to next)
    with BuildSketch(Plane(origin=(61.080747599, 23, -42.769199908), x_dir=(0.414672953097, -0.86240308464, -0.290357127642), z_dir=(0.706439249784, 0.506222203783, -0.494654087986)), mode=Mode.PRIVATE) as rib_9_sk1:
        with Locations((0, 5)):
            Rectangle(SKETCH_35_WALL_W, SKETCH_35_WALL_H)
    rib_9_tool1 = extrude(rib_9_sk1.sketch, amount=-RIB_9_REACH, mode=Mode.PRIVATE) - part.part
    add(rib_9_tool1.solids().sort_by_distance((61.080747599, 23, -42.769199908))[0])

    # 草图36 → 凸台-拉伸9 (add)
    with BuildSketch(Plane(origin=(0, 52, 0), x_dir=(1, 0, 0), z_dir=(0, 1, 0))):
        Circle(SKETCH_36_R)
        with Locations(Location((0, 0, 0), (0, 0, 270))):
            Circle(SKETCH_36_R_2, mode=Mode.SUBTRACT)
    extrude(amount=EXTRUDE_9_DEPTH)

    # 草图37 → 切除-拉伸3 (cut)
    with BuildSketch(Plane(origin=(0, 65, 0), x_dir=(1, 0, 0), z_dir=(0, 1, 0))):
        with Locations(Location((0, 0, 0), (0, 0, 270))):
            Circle(SKETCH_37_R)
    extrude(amount=-CUT_EXTRUDE_3_DEPTH, mode=Mode.SUBTRACT)


solid = part.part
